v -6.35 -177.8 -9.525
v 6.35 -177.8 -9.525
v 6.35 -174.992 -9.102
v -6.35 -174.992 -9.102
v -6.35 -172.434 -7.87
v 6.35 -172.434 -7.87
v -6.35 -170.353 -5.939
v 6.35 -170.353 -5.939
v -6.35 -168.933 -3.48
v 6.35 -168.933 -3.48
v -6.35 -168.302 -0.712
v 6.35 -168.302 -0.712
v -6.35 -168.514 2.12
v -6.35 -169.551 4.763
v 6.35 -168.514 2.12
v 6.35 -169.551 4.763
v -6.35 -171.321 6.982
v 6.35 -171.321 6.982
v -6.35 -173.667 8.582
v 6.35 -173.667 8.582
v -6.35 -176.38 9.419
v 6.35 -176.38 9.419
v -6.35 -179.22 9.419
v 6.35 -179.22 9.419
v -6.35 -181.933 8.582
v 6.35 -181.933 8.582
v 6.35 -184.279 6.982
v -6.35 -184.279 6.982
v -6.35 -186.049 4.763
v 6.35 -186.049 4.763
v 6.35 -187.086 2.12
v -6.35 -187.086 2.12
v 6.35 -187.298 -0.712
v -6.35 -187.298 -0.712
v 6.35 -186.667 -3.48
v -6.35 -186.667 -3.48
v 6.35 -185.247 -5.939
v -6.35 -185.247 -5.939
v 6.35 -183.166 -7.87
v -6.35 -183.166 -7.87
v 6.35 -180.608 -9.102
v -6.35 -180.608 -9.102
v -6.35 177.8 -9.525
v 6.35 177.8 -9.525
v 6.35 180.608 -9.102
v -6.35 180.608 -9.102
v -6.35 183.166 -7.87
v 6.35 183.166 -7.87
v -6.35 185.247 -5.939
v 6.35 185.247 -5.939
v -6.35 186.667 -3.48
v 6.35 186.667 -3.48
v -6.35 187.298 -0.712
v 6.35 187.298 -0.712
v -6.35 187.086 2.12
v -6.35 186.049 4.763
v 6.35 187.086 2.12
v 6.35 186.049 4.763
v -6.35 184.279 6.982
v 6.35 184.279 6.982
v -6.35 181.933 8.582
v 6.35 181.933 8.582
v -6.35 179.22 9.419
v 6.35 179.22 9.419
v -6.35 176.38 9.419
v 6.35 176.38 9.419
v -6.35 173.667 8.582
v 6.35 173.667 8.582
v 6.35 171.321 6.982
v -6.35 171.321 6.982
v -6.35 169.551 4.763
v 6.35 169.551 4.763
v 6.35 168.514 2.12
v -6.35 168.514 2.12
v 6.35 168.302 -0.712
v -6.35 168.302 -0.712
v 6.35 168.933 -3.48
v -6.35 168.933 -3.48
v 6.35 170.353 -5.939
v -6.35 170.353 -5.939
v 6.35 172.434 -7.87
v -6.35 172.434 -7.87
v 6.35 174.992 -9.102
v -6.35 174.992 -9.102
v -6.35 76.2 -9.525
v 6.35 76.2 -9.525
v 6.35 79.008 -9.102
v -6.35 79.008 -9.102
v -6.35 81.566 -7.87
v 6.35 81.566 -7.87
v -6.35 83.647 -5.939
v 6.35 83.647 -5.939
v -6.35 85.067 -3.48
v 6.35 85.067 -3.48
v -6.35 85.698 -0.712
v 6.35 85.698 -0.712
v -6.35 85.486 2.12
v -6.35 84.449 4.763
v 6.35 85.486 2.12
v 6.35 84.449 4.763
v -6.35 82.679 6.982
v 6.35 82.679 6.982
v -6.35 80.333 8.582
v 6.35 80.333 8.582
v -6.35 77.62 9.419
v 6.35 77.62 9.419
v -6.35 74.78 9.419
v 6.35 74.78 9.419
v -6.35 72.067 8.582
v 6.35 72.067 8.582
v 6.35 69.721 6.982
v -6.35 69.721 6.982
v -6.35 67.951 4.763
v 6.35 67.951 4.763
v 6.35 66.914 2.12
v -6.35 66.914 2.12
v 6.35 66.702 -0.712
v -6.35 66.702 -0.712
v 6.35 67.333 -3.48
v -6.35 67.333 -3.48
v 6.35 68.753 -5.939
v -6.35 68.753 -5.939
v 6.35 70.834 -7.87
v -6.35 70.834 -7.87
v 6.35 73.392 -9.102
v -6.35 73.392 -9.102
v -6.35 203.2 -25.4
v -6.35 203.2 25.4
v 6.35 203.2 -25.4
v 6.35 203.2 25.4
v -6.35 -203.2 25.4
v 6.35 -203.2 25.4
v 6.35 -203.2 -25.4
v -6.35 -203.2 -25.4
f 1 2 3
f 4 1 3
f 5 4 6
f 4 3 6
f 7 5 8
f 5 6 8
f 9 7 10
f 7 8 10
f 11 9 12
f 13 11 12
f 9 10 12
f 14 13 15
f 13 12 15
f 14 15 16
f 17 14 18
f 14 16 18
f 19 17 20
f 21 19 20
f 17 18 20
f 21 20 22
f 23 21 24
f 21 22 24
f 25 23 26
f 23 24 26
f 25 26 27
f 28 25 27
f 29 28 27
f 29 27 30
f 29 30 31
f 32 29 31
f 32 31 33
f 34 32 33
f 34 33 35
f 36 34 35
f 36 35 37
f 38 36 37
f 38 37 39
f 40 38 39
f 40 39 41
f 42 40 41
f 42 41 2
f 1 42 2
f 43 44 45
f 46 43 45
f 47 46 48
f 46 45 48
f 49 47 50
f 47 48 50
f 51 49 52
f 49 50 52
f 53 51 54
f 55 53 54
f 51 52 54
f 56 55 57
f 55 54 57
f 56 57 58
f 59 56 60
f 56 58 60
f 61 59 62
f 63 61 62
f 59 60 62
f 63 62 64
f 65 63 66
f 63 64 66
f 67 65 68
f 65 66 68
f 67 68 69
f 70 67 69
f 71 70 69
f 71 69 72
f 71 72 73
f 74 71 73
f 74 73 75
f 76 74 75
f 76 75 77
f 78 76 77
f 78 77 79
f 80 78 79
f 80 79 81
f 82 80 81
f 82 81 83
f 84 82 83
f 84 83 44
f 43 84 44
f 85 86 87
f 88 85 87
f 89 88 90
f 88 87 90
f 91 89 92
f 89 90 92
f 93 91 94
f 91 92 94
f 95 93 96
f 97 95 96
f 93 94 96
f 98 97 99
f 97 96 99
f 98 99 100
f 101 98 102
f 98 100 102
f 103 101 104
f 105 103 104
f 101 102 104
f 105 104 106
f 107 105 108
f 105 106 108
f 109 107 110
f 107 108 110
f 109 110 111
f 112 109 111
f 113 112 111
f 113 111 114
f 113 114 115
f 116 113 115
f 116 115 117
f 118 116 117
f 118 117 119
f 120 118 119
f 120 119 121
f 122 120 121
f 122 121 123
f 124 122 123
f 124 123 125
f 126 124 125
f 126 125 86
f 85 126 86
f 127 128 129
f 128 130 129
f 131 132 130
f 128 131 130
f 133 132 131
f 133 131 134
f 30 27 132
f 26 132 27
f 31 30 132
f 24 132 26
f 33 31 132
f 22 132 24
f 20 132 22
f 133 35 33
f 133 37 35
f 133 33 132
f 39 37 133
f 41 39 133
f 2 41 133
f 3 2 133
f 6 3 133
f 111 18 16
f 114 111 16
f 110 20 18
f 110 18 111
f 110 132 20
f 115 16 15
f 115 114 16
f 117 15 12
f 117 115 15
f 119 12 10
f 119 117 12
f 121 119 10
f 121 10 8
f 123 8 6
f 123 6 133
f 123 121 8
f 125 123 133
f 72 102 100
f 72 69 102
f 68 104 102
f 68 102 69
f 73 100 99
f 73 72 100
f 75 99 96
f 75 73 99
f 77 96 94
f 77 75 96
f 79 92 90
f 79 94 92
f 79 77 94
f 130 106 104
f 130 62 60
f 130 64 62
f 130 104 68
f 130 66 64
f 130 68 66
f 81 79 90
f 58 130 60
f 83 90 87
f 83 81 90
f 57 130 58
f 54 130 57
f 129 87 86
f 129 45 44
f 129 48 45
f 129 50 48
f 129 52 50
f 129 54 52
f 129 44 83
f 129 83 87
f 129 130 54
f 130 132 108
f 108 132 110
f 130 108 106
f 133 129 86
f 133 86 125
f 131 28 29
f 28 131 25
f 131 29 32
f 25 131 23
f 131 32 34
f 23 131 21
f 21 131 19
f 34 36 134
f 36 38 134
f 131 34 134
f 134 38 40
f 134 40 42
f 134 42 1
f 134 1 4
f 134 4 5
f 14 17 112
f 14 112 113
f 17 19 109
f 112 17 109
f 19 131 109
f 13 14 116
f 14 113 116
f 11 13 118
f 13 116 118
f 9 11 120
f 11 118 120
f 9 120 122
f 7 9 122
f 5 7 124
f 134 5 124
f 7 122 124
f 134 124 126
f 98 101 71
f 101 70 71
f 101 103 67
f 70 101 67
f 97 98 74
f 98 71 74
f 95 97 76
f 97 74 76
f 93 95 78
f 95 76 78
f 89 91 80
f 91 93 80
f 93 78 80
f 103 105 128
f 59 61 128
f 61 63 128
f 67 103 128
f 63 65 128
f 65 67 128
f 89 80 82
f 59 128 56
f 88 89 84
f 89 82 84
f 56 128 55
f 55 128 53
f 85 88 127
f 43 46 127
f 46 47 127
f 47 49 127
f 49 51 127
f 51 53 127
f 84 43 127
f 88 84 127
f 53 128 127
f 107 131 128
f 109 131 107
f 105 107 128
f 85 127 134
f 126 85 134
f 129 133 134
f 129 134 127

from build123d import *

# Parameters (mm, degrees)
SKETCH1_W           = 50.8
SKETCH1_H           = 406.4
BOSS_EXTRUDE1_DEPTH = 6.35
CUT_EXTRUDE1_REACH  = 14.7
SKETCH2_R           = 9.525


with BuildPart() as part:
    # Sketch1 → Boss-Extrude1 (new body, symmetric)
    with BuildSketch(Plane(origin=(0, 0, 0), x_dir=(0, 0, -1), z_dir=(1, 0, 0))):
        Rectangle(SKETCH1_W, SKETCH1_H)
    extrude(amount=BOSS_EXTRUDE1_DEPTH, both=True)

    # Sketch2 → Cut-Extrude1 (cut, up to next)
    with BuildSketch(Plane(origin=(6.35, 0, 0), x_dir=(0, 0, -1), z_dir=(1, 0, 0)), mode=Mode.PRIVATE) as cut_extrude1_sk1:
        with Locations((0, 177.8)):
            Circle(SKETCH2_R)
    cut_extrude1_tool1 = extrude(cut_extrude1_sk1.sketch, amount=-CUT_EXTRUDE1_REACH, mode=Mode.PRIVATE) & part.part
    add(cut_extrude1_tool1.solids().sort_by_distance((6.35, 177.8, 0))[0], mode=Mode.SUBTRACT)
    # Sketch2 → Cut-Extrude1 (cut, up to next)
    with BuildSketch(Plane(origin=(6.35, 0, 0), x_dir=(0, 0, -1), z_dir=(1, 0, 0)), mode=Mode.PRIVATE) as cut_extrude1_sk2:
        with Locations((0, -177.8)):
            Circle(SKETCH2_R)
    cut_extrude1_tool2 = extrude(cut_extrude1_sk2.sketch, amount=-CUT_EXTRUDE1_REACH, mode=Mode.PRIVATE) & part.part
    add(cut_extrude1_tool2.solids().sort_by_distance((6.35, -177.8, 0))[0], mode=Mode.SUBTRACT)
    # Sketch2 → Cut-Extrude1 (cut, up to next)
    with BuildSketch(Plane(origin=(6.35, 0, 0), x_dir=(0, 0, -1), z_dir=(1, 0, 0)), mode=Mode.PRIVATE) as cut_extrude1_sk3:
        with Locations((0, 76.2)):
            Circle(SKETCH2_R)
    cut_extrude1_tool3 = extrude(cut_extrude1_sk3.sketch, amount=-CUT_EXTRUDE1_REACH, mode=Mode.PRIVATE) & part.part
    add(cut_extrude1_tool3.solids().sort_by_distance((6.35, 76.2, 0))[0], mode=Mode.SUBTRACT)


solid = part.part
